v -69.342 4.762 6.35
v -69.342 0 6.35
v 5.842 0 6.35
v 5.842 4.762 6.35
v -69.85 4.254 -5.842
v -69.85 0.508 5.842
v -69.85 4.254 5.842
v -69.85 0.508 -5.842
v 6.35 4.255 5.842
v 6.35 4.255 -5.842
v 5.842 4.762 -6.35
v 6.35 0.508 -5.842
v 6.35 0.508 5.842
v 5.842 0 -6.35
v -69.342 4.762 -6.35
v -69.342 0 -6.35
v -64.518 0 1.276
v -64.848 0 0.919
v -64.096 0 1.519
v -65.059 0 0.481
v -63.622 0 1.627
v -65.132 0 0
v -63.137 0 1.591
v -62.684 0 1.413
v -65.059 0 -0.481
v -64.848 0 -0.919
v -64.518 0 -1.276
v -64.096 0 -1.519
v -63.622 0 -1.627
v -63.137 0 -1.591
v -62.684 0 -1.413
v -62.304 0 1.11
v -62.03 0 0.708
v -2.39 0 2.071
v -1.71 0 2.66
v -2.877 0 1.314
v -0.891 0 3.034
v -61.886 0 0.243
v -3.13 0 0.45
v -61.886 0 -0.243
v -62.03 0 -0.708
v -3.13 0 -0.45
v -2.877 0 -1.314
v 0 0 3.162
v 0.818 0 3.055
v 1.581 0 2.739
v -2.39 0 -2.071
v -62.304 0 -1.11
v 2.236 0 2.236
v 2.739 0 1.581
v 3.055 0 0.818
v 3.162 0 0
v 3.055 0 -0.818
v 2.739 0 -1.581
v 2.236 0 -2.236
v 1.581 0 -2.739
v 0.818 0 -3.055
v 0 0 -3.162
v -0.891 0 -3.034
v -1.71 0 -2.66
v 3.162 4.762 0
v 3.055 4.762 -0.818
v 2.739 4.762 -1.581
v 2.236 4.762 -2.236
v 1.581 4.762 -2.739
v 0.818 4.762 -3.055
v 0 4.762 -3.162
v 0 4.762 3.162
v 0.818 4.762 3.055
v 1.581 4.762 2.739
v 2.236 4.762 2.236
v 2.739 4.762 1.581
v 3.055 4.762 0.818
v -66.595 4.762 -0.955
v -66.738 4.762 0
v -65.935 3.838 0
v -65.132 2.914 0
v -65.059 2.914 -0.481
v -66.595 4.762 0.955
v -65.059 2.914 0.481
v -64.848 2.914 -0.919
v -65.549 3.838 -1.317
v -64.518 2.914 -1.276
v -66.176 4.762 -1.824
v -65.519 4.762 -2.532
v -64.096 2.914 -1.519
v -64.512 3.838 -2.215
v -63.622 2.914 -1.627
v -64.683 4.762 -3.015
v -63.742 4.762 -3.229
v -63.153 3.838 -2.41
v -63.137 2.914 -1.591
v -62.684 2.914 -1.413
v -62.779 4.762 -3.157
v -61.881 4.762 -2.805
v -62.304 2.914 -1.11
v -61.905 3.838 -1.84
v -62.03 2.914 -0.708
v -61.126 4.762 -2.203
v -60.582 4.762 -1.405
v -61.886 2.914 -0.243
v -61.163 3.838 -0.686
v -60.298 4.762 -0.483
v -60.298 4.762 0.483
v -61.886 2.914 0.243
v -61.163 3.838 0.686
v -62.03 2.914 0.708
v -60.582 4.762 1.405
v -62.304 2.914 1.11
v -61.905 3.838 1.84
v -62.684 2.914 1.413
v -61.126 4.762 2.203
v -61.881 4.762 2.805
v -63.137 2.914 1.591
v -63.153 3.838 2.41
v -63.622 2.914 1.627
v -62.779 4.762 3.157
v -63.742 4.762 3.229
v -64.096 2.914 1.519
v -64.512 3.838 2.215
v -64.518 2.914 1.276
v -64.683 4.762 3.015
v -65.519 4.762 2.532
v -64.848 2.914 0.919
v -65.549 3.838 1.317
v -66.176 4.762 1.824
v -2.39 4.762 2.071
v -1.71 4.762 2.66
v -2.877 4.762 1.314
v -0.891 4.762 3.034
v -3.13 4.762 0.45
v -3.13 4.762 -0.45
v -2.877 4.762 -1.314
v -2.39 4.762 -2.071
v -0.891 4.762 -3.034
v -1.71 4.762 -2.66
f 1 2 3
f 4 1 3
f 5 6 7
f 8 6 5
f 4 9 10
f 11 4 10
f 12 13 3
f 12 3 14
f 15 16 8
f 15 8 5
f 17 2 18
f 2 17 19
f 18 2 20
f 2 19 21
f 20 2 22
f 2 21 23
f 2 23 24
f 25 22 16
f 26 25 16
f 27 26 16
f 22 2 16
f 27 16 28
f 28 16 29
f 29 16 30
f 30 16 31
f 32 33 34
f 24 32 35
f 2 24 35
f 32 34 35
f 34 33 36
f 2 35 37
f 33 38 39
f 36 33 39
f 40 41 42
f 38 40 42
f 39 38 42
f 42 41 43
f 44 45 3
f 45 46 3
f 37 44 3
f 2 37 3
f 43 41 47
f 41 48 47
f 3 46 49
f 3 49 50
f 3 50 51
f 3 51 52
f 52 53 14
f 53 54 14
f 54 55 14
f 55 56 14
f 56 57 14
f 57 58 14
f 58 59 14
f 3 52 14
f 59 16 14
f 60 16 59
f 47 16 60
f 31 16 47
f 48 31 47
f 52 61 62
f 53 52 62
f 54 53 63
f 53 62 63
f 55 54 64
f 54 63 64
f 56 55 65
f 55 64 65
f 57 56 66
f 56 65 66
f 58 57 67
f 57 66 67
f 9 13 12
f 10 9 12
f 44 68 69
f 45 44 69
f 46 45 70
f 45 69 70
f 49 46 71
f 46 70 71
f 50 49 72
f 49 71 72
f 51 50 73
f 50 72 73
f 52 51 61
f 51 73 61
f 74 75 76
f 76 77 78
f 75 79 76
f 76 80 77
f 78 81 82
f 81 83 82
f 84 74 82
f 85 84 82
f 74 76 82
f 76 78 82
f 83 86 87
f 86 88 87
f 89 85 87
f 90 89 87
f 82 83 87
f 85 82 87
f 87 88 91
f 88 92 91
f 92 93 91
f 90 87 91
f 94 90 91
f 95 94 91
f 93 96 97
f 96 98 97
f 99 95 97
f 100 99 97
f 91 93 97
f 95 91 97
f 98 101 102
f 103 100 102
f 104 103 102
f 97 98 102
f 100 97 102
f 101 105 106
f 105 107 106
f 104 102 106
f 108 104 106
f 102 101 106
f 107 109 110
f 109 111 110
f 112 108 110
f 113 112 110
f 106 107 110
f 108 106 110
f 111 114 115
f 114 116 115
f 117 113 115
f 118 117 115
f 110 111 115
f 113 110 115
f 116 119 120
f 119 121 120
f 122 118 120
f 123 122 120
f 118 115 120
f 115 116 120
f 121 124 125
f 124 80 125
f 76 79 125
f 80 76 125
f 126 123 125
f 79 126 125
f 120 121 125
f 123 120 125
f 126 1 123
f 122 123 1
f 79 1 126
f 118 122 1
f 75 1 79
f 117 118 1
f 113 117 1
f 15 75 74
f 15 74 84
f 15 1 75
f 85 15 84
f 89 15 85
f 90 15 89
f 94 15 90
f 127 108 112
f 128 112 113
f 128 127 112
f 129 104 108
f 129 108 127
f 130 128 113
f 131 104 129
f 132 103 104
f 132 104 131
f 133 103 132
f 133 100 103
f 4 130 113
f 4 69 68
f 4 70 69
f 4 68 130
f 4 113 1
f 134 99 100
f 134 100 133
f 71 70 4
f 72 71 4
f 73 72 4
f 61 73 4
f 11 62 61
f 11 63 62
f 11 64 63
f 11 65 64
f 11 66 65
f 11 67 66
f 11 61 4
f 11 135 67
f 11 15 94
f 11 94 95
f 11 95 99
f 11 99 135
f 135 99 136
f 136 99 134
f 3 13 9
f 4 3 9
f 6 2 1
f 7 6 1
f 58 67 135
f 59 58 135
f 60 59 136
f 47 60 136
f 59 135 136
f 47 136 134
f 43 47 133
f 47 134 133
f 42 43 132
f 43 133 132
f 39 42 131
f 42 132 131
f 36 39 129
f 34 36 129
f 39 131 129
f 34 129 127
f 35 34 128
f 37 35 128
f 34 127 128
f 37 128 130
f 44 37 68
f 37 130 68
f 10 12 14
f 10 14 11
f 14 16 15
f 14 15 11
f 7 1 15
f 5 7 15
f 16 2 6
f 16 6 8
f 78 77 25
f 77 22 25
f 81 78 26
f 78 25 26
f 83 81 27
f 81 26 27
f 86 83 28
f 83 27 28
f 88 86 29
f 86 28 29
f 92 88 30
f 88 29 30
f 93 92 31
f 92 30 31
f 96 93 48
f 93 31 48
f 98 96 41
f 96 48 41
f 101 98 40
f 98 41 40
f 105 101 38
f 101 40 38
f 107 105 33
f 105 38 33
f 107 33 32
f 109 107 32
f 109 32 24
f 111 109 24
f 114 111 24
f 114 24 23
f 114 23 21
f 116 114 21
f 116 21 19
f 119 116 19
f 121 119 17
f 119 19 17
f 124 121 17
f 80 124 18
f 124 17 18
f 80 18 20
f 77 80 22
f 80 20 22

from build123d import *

# Parameters (mm, degrees)
SKETCH1_W                                         = 76.2
SKETCH1_H                                         = 12.7
BOSS_EXTRUDE2_DEPTH                               = 4.7625
CSK_FOR_4_FLAT_HEAD_SOCKET_CAP_SCREW1_D           = 3.2639
CSK_FOR_4_FLAT_HEAD_SOCKET_CAP_SCREW1_CSINK_D     = 6.477
CSK_FOR_4_FLAT_HEAD_SOCKET_CAP_SCREW1_CSINK_ANGLE = 82
CUT_EXTRUDE1_DEPTH                                = 5.7625
CHAMFER1_SIZE                                     = 0.508


with BuildPart() as part:
    # Sketch1 → Boss-Extrude2 (new body)
    with BuildSketch(Plane(origin=(0, 0, 0), x_dir=(1, 0, 0), z_dir=(0, 1, 0))):
        with Locations((-31.75, 0)):
            Rectangle(SKETCH1_W, SKETCH1_H)
    extrude(amount=BOSS_EXTRUDE2_DEPTH)

    # CSK for #4 Flat Head Socket Cap Screw1 (through all)
    with Locations(Plane(origin=(0, 4.7625, 0), x_dir=(1, 0, 0), z_dir=(0, 1, 0))):
        with Locations((-63.5, 0)):
            CounterSinkHole(CSK_FOR_4_FLAT_HEAD_SOCKET_CAP_SCREW1_D / 2, CSK_FOR_4_FLAT_HEAD_SOCKET_CAP_SCREW1_CSINK_D / 2, counter_sink_angle=CSK_FOR_4_FLAT_HEAD_SOCKET_CAP_SCREW1_CSINK_ANGLE)

    # Sketch2 → Cut-Extrude1 (cut, through all)
    with BuildSketch(Plane(origin=(0, 4.7625, 0), x_dir=(1, 0, 0), z_dir=(0, 1, 0))):
        with BuildLine():
            ThreePointArc((3.1623, 0), (2.236083774, 2.236083774), (0, 3.1623))
            Line((0, 3.1623), (0, -3.1623))
            ThreePointArc((0, -3.1623), (2.236083774, -2.236083774), (3.1623, 0))
        make_face()
        with BuildLine():
            Line((0, -3.1623), (0, 3.1623))
            ThreePointArc((0, 3.1623), (-3.1623, 0), (0, -3.1623))
        make_face()
    extrude(amount=-CUT_EXTRUDE1_DEPTH, mode=Mode.SUBTRACT)

    # Chamfer1
    chamfer1_edges = [part.edges().sort_by_distance(p)[0] for p in [
        (-69.85, 2.38125, 6.35),
        (-69.85, 2.38125, -6.35),
        (6.35, 2.38125, -6.35),
        (6.35, 2.38125, 6.35),
        (6.35, 4.7625, 0),
        (-69.85, 4.7625, 0),
        (-69.85, 0, 0),
        (6.35, 0, 0),
    ]]
    chamfer(chamfer1_edges, length=CHAMFER1_SIZE)


solid = part.part
